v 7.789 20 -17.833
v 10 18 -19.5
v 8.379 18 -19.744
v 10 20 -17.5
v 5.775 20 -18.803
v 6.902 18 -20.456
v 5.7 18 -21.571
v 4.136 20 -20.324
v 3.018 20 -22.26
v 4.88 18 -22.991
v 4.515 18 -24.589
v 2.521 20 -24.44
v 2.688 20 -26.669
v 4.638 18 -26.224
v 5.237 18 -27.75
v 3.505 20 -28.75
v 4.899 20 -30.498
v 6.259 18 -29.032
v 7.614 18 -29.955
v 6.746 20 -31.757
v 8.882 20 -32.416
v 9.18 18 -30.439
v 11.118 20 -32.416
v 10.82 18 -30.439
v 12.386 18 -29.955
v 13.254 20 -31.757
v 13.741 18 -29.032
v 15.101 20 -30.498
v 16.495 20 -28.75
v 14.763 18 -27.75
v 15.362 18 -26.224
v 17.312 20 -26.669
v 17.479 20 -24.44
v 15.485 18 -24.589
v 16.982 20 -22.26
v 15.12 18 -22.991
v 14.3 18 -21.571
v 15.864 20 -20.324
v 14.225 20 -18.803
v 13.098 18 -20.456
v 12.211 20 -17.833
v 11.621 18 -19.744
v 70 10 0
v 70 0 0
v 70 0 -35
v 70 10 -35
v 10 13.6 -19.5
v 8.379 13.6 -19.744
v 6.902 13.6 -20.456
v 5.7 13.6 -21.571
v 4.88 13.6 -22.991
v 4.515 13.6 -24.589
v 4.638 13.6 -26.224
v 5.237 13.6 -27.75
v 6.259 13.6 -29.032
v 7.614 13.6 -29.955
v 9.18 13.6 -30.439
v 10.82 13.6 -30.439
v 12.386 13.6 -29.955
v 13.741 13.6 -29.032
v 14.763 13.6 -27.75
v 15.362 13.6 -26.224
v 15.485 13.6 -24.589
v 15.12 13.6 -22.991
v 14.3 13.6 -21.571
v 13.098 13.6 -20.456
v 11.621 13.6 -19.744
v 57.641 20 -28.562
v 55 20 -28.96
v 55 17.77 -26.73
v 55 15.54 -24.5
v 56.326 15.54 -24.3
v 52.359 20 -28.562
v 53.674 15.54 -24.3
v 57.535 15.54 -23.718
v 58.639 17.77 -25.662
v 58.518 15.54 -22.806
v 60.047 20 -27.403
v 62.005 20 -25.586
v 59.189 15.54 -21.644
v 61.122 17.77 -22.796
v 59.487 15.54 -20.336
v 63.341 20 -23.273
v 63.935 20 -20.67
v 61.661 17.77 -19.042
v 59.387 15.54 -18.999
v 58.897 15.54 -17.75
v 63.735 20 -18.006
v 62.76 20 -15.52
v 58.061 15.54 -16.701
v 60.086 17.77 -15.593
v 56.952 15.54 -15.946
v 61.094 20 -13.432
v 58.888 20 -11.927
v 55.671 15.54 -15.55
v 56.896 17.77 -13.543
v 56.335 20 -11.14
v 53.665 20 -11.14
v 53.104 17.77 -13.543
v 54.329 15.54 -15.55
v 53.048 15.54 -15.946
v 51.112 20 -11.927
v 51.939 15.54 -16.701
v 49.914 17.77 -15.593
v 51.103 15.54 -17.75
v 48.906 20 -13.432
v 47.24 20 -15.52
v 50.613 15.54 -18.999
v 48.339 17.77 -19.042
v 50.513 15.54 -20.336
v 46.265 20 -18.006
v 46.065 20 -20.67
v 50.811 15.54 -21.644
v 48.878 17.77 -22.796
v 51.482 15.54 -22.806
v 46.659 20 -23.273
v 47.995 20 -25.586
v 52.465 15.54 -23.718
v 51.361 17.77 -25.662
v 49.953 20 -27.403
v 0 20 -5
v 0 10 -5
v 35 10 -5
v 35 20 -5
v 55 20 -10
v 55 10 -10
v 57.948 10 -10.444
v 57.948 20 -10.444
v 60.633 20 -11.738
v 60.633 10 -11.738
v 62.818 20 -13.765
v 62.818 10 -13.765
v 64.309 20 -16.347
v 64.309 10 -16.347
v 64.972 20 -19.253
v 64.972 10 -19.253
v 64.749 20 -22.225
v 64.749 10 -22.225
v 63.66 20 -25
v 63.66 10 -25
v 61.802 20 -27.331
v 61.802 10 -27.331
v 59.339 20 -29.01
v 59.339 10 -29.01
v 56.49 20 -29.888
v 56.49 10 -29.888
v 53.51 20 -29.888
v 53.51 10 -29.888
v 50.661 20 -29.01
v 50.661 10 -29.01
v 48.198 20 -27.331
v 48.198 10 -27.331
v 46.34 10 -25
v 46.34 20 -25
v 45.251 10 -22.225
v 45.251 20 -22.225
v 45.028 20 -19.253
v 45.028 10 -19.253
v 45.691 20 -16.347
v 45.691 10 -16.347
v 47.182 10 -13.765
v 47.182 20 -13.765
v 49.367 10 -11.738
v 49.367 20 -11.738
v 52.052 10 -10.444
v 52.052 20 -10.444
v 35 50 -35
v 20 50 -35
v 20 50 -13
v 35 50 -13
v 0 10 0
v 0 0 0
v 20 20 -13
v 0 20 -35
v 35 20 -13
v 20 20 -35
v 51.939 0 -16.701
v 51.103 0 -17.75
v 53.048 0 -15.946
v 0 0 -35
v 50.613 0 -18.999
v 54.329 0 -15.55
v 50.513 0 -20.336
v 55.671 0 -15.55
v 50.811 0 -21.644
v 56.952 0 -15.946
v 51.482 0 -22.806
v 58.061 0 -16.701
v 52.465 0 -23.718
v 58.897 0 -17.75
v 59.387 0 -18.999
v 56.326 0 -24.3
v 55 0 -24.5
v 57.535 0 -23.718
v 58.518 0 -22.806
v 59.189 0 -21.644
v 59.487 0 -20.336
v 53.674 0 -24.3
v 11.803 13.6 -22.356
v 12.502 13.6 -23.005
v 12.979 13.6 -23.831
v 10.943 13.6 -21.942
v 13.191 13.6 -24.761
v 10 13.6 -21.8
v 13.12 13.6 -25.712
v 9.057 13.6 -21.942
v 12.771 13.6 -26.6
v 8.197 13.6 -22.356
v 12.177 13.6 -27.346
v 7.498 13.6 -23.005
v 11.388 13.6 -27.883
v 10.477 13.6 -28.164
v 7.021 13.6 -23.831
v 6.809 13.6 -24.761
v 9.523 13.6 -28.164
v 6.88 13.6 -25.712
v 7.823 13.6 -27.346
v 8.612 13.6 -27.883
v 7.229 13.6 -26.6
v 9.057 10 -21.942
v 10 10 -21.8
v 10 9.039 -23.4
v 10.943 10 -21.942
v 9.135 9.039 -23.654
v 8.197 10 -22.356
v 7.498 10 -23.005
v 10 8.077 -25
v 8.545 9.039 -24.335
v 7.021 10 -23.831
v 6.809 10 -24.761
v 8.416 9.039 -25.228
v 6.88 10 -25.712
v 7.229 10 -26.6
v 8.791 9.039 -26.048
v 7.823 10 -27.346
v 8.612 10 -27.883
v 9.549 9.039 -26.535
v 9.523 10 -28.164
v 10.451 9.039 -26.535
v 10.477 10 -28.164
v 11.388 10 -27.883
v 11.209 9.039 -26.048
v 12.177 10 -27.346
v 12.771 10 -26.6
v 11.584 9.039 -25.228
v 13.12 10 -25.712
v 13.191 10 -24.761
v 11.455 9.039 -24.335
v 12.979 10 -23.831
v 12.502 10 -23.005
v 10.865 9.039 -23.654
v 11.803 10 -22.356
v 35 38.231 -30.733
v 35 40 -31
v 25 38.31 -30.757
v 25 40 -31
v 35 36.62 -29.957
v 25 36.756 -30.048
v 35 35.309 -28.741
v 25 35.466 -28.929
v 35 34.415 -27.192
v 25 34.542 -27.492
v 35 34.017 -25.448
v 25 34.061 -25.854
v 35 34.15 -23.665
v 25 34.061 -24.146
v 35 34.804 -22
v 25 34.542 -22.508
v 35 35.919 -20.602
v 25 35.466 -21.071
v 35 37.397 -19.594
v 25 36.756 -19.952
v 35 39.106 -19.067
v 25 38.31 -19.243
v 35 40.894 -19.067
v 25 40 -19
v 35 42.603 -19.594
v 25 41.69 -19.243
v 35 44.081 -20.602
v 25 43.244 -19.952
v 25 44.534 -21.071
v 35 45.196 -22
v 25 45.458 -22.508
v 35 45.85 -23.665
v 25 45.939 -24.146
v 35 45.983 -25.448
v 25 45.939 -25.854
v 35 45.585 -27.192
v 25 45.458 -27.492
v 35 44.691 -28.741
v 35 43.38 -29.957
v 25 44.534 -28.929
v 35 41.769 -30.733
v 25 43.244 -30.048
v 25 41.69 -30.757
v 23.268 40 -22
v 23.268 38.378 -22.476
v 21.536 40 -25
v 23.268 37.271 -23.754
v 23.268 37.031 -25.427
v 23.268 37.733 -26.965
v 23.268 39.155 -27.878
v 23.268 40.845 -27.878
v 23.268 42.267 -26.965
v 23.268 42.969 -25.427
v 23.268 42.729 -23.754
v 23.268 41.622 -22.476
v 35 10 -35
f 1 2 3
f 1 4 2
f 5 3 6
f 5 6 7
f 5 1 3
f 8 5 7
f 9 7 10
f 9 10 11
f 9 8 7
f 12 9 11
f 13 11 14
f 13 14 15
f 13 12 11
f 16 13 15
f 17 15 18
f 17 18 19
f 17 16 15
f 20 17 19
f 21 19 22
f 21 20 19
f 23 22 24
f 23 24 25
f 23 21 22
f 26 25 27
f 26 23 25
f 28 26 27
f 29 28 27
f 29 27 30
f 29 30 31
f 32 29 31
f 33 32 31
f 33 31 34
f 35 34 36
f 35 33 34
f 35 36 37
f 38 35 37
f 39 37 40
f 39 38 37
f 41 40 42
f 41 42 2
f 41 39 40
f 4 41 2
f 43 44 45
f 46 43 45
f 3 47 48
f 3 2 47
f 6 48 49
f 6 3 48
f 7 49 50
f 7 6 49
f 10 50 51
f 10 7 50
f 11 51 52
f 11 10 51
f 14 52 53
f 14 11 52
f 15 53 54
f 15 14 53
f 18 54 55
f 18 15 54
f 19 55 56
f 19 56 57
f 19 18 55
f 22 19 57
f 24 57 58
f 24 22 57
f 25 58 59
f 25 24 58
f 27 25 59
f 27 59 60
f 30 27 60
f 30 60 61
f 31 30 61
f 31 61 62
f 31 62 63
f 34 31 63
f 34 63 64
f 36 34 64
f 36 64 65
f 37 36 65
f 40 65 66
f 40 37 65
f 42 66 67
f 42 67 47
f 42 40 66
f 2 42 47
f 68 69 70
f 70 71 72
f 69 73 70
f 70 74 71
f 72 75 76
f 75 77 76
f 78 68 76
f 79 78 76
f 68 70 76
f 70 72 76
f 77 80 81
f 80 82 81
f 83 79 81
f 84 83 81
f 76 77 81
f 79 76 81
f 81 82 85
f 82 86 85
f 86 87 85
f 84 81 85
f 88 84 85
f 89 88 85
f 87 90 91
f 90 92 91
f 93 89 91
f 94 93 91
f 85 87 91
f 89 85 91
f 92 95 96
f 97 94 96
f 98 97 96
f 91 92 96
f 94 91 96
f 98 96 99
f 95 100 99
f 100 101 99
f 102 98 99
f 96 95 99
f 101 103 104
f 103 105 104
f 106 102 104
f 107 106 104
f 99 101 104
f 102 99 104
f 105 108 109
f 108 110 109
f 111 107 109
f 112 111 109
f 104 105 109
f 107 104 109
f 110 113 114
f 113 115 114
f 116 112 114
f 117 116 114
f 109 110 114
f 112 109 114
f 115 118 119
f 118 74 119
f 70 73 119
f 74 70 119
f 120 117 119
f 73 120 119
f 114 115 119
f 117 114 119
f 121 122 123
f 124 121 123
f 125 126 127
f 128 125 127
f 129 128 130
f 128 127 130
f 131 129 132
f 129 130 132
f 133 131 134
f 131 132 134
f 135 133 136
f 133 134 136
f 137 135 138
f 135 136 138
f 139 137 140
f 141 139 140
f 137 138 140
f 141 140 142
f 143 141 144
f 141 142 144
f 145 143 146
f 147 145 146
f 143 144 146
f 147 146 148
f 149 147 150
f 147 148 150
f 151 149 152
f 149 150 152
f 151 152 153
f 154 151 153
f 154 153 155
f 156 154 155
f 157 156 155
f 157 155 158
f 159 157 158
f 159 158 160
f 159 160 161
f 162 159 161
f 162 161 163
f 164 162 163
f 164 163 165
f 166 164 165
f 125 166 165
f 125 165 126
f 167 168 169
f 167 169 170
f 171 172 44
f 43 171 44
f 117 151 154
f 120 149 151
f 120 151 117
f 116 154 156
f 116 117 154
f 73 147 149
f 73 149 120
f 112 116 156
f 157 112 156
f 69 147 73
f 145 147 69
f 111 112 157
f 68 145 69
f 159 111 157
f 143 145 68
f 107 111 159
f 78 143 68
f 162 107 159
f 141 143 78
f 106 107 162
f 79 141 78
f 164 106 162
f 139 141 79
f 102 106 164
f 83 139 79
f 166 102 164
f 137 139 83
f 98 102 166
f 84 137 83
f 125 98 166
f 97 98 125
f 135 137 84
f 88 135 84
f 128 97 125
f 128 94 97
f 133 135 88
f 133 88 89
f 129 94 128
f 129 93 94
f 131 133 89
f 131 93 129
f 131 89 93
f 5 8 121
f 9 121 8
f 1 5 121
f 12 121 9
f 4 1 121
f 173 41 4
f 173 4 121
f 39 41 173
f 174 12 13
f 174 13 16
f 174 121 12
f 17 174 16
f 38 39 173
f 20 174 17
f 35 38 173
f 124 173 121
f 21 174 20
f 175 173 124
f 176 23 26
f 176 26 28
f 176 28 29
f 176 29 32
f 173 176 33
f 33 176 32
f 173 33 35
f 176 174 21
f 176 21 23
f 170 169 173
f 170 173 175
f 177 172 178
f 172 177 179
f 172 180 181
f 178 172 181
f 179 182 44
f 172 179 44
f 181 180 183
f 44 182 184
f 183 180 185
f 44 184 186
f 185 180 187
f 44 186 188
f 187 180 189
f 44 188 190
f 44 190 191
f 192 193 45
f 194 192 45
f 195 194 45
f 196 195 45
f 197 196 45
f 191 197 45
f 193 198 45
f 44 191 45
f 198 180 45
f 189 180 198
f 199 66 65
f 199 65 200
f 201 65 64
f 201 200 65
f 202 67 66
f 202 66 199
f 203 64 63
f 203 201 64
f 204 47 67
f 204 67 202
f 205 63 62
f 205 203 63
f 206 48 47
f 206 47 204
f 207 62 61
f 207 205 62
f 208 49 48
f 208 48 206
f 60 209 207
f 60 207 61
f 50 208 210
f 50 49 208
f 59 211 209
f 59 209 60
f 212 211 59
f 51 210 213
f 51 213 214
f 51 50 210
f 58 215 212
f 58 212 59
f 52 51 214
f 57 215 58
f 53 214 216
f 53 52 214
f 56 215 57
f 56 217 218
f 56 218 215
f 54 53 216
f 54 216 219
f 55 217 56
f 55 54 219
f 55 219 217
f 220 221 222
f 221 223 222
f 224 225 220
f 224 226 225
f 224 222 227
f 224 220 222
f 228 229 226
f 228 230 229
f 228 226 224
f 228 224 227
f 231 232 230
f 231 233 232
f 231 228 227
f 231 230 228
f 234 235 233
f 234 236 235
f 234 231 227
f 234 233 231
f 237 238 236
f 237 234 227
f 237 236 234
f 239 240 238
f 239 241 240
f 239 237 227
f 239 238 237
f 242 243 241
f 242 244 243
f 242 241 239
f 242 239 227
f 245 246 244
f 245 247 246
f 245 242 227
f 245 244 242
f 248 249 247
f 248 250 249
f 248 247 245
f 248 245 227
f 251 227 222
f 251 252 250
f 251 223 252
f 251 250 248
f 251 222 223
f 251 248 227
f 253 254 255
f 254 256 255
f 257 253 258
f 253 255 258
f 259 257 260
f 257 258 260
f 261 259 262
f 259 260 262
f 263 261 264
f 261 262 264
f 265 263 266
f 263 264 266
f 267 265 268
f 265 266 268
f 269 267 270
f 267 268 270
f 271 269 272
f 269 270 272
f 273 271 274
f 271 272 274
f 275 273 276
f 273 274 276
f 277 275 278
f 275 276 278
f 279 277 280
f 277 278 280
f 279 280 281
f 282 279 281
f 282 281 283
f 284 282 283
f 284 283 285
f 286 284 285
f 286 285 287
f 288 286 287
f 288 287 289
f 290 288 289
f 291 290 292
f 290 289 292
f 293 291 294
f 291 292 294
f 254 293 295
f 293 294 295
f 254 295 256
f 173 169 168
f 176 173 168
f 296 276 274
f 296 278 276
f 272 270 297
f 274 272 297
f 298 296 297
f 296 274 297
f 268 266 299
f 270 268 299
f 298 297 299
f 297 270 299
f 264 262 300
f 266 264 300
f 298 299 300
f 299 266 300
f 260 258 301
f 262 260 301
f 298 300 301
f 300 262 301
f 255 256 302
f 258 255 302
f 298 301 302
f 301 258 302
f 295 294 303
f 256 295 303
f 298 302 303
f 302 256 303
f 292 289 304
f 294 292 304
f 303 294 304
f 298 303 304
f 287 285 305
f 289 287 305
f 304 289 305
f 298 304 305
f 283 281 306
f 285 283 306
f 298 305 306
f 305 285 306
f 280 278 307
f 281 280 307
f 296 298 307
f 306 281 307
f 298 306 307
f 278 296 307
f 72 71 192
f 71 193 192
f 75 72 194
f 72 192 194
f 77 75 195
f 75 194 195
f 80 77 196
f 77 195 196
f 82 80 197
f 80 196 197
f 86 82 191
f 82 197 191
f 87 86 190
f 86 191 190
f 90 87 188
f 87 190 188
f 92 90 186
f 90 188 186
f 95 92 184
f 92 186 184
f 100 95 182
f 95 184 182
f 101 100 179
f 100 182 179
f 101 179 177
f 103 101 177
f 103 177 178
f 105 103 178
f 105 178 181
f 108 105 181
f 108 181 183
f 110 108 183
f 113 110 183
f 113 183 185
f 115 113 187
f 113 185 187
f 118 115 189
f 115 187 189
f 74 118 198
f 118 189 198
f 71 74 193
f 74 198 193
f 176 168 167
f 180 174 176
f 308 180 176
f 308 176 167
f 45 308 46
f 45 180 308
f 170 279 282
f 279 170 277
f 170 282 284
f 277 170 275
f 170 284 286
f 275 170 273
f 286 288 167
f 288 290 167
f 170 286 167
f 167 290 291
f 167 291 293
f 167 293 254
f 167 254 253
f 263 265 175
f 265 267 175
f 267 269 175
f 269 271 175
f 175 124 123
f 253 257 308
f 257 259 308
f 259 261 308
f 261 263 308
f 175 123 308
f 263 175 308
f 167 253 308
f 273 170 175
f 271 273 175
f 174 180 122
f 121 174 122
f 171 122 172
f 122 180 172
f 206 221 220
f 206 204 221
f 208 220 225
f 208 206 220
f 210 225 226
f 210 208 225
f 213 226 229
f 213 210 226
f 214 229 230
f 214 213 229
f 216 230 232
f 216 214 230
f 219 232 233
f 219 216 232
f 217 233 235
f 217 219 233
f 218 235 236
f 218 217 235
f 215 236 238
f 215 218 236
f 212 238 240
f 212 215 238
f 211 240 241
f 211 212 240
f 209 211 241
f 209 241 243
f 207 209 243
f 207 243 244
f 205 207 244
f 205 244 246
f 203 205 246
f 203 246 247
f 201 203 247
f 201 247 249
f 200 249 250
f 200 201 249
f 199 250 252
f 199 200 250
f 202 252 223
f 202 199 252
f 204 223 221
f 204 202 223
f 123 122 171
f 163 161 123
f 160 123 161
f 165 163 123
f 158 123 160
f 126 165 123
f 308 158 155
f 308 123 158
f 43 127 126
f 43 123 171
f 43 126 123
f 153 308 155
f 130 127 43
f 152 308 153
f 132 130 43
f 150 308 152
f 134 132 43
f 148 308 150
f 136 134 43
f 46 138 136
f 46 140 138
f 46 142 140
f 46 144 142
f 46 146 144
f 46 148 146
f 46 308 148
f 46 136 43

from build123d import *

# Parameters (mm, degrees)
SKETCH1_R                                            = 10
BOSS_EXTRUDE1_DEPTH                                  = 10
SKETCH1_3_R                                          = 10
BOSS_EXTRUDE2_DEPTH                                  = 20
SKETCH1_4_W                                          = 15
SKETCH1_4_H                                          = 22
BOSS_EXTRUDE3_DEPTH                                  = 50
CSK_FOR_M8_HEX_SOCKET_COUNTERSUNK_CAP_SC_D           = 9
CSK_FOR_M8_HEX_SOCKET_COUNTERSUNK_CAP_SC_CSINK_D     = 17.92
CSK_FOR_M8_HEX_SOCKET_COUNTERSUNK_CAP_SC_CSINK_ANGLE = 90
TAP_DRILL_FOR_M8_TAP1_D                              = 12
TAP_DRILL_FOR_M8_TAP1_DEPTH                          = 10
TAP_DRILL_FOR_M8_TAP1_TIP                            = 3.464101615


with BuildPart() as part:
    # Sketch1 → Boss-Extrude1 (new body)
    with BuildSketch(Plane(origin=(0, 0, 0), x_dir=(1, 0, 0), z_dir=(0, 1, 0))):
        Polygon((0, 5), (0, 0), (70, 0), (70, 35), (35, 35), (35, 13), (35, 5), align=None)
        with Locations((55, 20)):
            Circle(SKETCH1_R, mode=Mode.SUBTRACT)
    extrude(amount=BOSS_EXTRUDE1_DEPTH)

    # Sketch1<3> → Boss-Extrude2 (add)
    with BuildSketch(Plane(origin=(0, 0, 0), x_dir=(1, 0, 0), z_dir=(0, 1, 0))):
        Polygon((0, 35), (0, 5), (35, 5), (35, 13), (20, 13), (20, 35), align=None)
        with Locations((55, 20)):
            Circle(SKETCH1_3_R)
    extrude(amount=BOSS_EXTRUDE2_DEPTH)

    # Sketch1<4> → Boss-Extrude3 (add)
    with BuildSketch(Plane(origin=(0, 0, 0), x_dir=(1, 0, 0), z_dir=(0, 1, 0))):
        with Locations((27.5, 24)):
            Rectangle(SKETCH1_4_W, SKETCH1_4_H)
    extrude(amount=BOSS_EXTRUDE3_DEPTH)

    # CSK for M8 Hex Socket Countersunk Cap Screw1 (through all)
    with Locations(Plane(origin=(55, 20, -20), x_dir=(0, 0, 1), z_dir=(0, 1, 0))):
        with Locations((0, 0)):
            CounterSinkHole(CSK_FOR_M8_HEX_SOCKET_COUNTERSUNK_CAP_SC_D / 2, CSK_FOR_M8_HEX_SOCKET_COUNTERSUNK_CAP_SC_CSINK_D / 2, counter_sink_angle=CSK_FOR_M8_HEX_SOCKET_COUNTERSUNK_CAP_SC_CSINK_ANGLE)

    # Sketch5 → CBORE for M6 Hex Socket Head Cap Screw1 (revolve, cut)
    with BuildSketch(Plane(origin=(10, 20, -25), x_dir=(0, 0, 1), z_dir=(1, 0, 0))):
        Polygon((0, 0), (0, 11.922753981), (3.2, 10), (3.2, 6.4), (5.5, 6.4), (5.5, 2), (7.5, 0), align=None)
    revolve(axis=Axis((10, 26.35, -25), (0, -1, 0)), mode=Mode.SUBTRACT)

    # Tap Drill for M8 Tap1
    with Locations(Plane(origin=(35, 40, -25), x_dir=(0, 0, 1), z_dir=(1, 0, 0))):
        with Locations((0, 0)):
            Hole(TAP_DRILL_FOR_M8_TAP1_D / 2, depth=TAP_DRILL_FOR_M8_TAP1_DEPTH)
            with Locations((0, 0, -(TAP_DRILL_FOR_M8_TAP1_DEPTH + TAP_DRILL_FOR_M8_TAP1_TIP / 2))):  # 120° drill point
                Cone(0, TAP_DRILL_FOR_M8_TAP1_D / 2, TAP_DRILL_FOR_M8_TAP1_TIP, mode=Mode.SUBTRACT)


solid = part.part
